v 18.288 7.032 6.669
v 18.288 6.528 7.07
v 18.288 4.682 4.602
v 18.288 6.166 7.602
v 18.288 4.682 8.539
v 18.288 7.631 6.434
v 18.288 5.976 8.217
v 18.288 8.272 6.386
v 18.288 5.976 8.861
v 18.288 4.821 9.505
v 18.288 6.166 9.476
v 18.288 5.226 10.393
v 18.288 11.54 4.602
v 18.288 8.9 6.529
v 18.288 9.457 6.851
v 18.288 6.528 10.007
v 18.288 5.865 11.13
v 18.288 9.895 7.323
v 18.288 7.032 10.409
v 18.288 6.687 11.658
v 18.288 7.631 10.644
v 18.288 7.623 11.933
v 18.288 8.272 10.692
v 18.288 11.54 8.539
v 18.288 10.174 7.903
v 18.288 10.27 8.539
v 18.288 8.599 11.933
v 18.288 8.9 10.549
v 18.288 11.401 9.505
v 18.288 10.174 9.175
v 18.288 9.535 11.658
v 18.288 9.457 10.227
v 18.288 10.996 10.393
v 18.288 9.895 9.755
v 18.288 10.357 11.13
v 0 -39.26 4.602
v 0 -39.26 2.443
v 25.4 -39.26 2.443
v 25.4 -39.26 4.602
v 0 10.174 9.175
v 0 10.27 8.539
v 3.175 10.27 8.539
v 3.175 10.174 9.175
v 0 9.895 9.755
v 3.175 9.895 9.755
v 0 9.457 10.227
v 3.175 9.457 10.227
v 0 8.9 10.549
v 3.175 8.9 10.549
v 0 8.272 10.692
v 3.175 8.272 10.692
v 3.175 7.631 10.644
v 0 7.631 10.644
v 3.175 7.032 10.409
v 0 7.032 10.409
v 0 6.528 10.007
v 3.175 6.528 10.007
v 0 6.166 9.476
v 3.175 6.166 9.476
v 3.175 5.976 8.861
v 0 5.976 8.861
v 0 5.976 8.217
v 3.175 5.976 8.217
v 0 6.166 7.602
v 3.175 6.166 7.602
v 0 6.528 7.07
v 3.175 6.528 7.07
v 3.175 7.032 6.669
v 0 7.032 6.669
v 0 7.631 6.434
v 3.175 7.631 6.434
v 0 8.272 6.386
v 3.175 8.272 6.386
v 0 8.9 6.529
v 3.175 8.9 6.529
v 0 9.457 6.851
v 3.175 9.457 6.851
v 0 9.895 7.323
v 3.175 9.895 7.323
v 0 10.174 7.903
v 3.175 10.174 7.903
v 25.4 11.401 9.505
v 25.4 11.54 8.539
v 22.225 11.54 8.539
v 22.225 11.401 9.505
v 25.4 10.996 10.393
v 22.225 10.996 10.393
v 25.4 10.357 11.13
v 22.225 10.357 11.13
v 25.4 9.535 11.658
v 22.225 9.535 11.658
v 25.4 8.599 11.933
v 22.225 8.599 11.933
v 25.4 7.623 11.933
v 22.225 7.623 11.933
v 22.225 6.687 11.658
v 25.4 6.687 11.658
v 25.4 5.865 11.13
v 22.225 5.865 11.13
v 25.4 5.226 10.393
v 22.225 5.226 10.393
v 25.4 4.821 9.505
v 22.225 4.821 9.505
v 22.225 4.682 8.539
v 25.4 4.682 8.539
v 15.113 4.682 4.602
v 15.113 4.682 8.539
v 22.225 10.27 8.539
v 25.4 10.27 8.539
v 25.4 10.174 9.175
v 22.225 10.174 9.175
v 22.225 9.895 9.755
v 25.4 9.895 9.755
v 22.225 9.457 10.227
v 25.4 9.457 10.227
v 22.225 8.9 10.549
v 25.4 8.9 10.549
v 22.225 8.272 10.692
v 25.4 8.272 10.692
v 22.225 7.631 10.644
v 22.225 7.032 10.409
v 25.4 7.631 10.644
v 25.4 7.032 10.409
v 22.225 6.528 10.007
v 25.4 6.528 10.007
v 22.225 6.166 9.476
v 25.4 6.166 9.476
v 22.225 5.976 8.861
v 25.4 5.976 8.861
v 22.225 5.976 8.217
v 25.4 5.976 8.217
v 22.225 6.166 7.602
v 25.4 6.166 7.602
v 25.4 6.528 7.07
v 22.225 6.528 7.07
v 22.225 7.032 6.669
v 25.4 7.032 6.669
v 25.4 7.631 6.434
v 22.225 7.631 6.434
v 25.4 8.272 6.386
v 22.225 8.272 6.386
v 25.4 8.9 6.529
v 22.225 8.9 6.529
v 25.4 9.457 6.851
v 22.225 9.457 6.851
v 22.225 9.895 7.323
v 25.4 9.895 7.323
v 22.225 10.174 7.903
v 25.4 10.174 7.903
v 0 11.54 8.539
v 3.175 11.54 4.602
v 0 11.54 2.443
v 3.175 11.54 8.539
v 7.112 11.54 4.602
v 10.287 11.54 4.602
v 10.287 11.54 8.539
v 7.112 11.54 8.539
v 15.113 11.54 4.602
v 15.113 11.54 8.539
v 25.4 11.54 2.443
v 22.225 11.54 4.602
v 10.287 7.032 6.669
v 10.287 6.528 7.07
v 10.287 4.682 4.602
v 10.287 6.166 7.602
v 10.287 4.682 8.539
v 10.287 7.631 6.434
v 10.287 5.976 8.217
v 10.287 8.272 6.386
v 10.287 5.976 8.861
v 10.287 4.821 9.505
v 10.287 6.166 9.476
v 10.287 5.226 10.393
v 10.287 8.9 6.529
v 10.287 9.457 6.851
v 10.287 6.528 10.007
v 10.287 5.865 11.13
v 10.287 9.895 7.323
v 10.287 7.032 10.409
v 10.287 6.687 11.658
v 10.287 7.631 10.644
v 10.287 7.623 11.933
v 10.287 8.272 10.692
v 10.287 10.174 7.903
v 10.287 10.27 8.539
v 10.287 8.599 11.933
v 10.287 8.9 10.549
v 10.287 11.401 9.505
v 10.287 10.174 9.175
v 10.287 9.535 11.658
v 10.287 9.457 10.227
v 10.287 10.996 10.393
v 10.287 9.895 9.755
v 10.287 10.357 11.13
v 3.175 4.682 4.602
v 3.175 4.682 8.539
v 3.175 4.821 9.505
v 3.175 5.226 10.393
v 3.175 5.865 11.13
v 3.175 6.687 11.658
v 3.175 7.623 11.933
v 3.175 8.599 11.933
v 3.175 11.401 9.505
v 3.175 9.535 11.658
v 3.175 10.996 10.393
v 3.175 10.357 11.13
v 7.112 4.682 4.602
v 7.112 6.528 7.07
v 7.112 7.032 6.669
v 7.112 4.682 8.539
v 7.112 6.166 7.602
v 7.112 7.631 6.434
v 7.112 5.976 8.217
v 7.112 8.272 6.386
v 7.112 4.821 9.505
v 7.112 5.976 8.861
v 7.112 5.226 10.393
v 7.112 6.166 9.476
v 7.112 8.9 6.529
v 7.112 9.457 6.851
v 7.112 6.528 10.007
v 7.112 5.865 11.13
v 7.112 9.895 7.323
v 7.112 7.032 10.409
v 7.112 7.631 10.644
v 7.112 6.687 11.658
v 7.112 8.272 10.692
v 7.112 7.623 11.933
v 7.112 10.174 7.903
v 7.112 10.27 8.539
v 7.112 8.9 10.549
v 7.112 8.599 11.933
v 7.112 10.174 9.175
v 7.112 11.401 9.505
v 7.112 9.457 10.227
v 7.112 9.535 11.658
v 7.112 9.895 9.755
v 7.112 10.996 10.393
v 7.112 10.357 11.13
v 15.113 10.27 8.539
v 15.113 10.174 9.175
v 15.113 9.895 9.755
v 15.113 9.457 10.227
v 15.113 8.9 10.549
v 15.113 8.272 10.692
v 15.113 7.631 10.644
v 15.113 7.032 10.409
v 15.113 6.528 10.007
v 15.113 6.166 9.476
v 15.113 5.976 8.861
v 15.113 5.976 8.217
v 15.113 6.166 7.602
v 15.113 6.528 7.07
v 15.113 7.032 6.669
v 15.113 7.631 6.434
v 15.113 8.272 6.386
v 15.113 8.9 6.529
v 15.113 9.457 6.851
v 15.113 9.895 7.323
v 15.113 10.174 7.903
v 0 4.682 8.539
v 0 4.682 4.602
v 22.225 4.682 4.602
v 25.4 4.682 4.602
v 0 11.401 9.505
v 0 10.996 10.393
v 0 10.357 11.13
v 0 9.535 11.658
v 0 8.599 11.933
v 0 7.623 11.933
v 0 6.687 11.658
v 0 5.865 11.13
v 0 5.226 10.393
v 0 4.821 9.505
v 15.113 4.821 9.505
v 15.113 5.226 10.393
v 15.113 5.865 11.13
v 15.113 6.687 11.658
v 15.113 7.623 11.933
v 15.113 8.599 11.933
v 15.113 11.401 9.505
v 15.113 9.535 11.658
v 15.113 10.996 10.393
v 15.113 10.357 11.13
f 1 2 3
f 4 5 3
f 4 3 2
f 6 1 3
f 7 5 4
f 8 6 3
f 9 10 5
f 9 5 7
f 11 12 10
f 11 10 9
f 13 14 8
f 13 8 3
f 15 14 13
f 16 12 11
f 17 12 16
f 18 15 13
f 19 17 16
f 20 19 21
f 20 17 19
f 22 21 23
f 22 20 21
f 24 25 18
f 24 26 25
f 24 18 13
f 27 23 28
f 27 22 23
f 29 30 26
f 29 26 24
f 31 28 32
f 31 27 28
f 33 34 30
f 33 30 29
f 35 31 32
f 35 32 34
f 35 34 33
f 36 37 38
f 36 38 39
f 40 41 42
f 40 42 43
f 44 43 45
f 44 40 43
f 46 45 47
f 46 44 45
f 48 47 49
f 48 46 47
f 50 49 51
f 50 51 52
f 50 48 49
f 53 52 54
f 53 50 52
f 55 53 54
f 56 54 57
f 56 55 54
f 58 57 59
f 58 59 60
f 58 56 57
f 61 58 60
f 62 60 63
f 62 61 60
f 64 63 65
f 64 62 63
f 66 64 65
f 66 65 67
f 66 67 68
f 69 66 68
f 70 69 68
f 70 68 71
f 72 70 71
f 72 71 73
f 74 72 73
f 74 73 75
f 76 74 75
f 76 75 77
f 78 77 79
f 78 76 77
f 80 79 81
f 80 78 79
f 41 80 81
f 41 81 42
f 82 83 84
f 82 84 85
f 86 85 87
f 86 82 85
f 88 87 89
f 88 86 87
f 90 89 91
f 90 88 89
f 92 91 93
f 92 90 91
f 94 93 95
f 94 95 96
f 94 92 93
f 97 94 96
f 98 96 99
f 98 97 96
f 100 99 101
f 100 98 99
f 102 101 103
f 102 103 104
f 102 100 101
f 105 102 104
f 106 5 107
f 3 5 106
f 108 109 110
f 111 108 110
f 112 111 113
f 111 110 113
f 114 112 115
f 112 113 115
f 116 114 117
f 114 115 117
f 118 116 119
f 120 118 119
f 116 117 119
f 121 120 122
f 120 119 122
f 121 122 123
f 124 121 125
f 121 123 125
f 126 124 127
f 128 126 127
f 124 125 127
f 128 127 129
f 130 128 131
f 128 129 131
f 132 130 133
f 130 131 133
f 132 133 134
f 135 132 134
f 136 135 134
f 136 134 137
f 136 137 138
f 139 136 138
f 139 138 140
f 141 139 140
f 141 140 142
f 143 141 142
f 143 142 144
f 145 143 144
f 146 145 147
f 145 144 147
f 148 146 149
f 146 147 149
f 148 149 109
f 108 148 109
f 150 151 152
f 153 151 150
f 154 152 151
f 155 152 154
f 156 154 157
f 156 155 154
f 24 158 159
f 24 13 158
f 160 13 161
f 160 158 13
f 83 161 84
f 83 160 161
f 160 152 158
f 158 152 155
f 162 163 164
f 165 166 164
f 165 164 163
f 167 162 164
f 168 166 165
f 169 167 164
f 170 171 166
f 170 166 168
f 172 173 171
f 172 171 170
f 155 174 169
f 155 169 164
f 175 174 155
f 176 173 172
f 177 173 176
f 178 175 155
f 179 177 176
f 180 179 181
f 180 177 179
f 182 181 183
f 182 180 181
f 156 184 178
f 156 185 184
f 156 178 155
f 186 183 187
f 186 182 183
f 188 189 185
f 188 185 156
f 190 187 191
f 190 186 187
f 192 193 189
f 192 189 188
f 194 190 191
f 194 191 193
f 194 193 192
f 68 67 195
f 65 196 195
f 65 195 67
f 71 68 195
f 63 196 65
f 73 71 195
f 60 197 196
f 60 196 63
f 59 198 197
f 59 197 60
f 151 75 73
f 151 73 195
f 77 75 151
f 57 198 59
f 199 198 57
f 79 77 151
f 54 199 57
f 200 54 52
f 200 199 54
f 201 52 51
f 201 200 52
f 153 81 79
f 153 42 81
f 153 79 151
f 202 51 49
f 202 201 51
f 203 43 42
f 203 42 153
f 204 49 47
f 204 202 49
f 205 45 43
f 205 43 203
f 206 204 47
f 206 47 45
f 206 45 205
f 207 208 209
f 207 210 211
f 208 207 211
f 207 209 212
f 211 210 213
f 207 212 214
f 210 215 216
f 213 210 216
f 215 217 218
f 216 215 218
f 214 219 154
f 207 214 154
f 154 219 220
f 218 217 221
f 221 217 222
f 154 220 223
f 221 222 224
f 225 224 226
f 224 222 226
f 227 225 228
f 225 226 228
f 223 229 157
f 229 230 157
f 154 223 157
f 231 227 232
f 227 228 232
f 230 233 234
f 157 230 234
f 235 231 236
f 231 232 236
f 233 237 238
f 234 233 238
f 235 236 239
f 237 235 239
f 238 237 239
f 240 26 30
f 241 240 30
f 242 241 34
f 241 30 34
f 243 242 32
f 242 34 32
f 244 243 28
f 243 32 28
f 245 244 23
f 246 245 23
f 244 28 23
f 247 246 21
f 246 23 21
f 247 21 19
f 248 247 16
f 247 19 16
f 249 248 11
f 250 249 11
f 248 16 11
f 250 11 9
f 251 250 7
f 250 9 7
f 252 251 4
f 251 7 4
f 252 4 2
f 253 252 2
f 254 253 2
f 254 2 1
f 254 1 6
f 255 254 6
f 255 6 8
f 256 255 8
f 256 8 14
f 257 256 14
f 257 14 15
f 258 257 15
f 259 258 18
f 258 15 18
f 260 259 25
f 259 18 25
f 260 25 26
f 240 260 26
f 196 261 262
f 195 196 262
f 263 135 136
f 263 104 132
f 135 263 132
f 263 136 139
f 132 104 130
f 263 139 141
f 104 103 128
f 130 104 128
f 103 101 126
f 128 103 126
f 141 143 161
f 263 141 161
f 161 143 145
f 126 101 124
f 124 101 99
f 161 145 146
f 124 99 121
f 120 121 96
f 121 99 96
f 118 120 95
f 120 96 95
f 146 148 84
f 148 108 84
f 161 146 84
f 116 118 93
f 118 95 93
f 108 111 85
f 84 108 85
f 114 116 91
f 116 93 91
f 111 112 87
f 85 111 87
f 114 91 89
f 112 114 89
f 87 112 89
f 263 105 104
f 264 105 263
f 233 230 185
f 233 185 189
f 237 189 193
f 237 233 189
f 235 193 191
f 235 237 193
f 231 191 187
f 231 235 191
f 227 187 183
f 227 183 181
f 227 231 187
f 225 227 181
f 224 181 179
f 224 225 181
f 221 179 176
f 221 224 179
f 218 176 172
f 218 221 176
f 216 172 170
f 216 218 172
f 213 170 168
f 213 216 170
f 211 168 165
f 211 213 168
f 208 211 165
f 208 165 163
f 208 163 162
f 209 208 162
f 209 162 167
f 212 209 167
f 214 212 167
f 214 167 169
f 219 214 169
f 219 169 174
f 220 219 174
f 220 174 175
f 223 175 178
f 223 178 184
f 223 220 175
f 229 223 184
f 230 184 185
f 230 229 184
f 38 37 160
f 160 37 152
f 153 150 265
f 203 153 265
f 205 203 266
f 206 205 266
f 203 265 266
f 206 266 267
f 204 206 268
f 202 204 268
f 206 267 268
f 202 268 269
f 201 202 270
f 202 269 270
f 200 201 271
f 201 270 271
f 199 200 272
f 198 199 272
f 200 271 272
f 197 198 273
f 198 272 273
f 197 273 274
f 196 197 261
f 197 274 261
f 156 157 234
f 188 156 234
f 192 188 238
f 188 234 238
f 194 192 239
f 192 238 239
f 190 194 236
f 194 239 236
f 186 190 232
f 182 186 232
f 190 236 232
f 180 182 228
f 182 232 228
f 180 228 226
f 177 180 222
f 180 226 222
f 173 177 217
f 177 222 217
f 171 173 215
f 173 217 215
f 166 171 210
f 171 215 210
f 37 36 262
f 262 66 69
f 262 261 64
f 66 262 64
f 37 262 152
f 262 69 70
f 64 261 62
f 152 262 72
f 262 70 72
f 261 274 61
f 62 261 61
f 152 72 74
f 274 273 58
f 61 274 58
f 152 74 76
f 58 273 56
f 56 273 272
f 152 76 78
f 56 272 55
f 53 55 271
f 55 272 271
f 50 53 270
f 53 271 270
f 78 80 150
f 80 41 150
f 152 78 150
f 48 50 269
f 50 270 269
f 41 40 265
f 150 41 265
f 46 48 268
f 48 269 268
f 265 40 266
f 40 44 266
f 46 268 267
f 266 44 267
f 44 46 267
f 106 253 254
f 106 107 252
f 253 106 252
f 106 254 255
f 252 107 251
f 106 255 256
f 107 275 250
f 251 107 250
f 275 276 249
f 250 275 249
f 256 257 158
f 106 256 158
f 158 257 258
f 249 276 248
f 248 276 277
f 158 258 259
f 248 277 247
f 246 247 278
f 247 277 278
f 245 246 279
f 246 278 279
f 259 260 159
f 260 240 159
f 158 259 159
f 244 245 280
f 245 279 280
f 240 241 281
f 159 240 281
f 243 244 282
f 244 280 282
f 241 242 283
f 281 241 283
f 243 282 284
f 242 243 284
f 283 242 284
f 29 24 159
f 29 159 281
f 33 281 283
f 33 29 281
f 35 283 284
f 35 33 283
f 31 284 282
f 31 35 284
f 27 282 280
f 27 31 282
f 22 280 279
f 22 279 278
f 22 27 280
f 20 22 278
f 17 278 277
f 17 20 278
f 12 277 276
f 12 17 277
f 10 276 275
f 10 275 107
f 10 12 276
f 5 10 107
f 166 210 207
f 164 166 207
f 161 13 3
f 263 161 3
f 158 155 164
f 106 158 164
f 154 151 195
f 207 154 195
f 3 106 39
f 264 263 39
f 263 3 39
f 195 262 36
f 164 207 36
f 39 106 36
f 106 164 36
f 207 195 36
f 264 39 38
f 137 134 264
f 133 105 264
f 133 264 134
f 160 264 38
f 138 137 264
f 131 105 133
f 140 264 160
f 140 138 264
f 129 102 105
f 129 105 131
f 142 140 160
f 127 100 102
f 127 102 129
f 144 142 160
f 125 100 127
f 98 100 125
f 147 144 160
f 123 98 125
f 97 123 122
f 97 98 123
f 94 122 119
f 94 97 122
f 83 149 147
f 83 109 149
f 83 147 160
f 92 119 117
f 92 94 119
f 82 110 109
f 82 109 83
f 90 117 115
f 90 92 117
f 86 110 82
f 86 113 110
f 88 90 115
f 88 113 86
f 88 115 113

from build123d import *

# Parameters (mm, degrees)
F0_W      = 43.942
F0_H      = 2.159
F0_W_2    = 6.858
F1_DEPTH  = 25.4
F0_R      = 2.159
F2_DEPTH  = 3.175
F3_R      = 2.159
F4_DEPTH  = 3.175
F6_R      = 2.159
F7_DEPTH  = 3.175
F9_R      = 2.159
F10_DEPTH = 3.175


with BuildPart() as f1:
    # F0 (on Right) → F1 (new body)
    with BuildSketch(Plane.YZ):
        with Locations((-17.288983049, 3.5224220661)):
            Rectangle(F0_W, F0_H)
        with Locations((8.111016951, 3.5224220661)):
            Rectangle(F0_W_2, F0_H)
    extrude(amount=F1_DEPTH)

    # F0 (on Right) → F2 (join)
    with BuildSketch(Plane.YZ):
        with BuildLine():
            Line((4.682016951, 8.5389220661), (4.682016951, 4.6019220661))
            Line((4.682016951, 4.6019220661), (11.540016951, 4.6019220661))
            Line((11.540016951, 4.6019220661), (11.540016951, 8.5389220661))
            ThreePointArc((11.540016951, 8.5389220661), (8.111016951, 5.1099220661), (4.682016951, 8.5389220661))
        make_face()
        with BuildLine():
            ThreePointArc((11.540016951, 8.5389220661), (8.111016951, 11.9679220661), (4.682016951, 8.5389220661))
            ThreePointArc((4.682016951, 8.5389220661), (8.111016951, 5.1099220661), (11.540016951, 8.5389220661))
        make_face()
        with Locations((8.111016951, 8.5389220661)):
            Circle(F0_R, mode=Mode.SUBTRACT)
    extrude(amount=F2_DEPTH)

    # F3 (on face) → F4 (join)
    with BuildSketch(Plane.YZ.offset(25.4)):
        with BuildLine():
            ThreePointArc((4.682016951, 8.5389220661), (8.111016951, 5.1099220661), (11.540016951, 8.5389220661))
            ThreePointArc((11.540016951, 8.5389220661), (8.111016951, 11.9679220661), (4.682016951, 8.5389220661))
        make_face()
        with Locations((8.111016951, 8.5389220661)):
            Circle(F3_R, mode=Mode.SUBTRACT)
        with BuildLine():
            Line((11.540016951, 4.6019220661), (11.540016951, 8.5389220661))
            ThreePointArc((11.540016951, 8.5389220661), (8.111016951, 5.1099220661), (4.682016951, 8.5389220661))
            Line((4.682016951, 8.5389220661), (4.682016951, 4.6019220661))
            Line((4.682016951, 4.6019220661), (11.540016951, 4.6019220661))
        make_face()
    extrude(amount=-F4_DEPTH)

    # F6 (on offset) → F7 (join)
    with BuildSketch(Plane.YZ.offset(7.112)):
        with BuildLine():
            Line((11.540016951, 4.6019220661), (11.540016951, 8.5389220661))
            ThreePointArc((11.540016951, 8.5389220661), (8.111016951, 11.9679220661), (4.682016951, 8.5389220661))
            Line((4.682016951, 8.5389220661), (4.682016951, 4.6019220661))
            Line((4.682016951, 4.6019220661), (11.540016951, 4.6019220661))
        make_face()
        with Locations((8.111016951, 8.5389220661)):
            Circle(F6_R, mode=Mode.SUBTRACT)
    extrude(amount=F7_DEPTH)

    # F9 (on offset) → F10 (join)
    with BuildSketch(Plane.YZ.offset(18.288)):
        with BuildLine():
            Line((4.682016951, 8.5389220661), (4.682016951, 4.6019220661))
            Line((4.682016951, 4.6019220661), (11.540016951, 4.6019220661))
            Line((11.540016951, 4.6019220661), (11.540016951, 8.5389220661))
            ThreePointArc((11.540016951, 8.5389220661), (8.111016951, 11.9679220661), (4.682016951, 8.5389220661))
        make_face()
        with Locations((8.111016951, 8.5389220661)):
            Circle(F9_R, mode=Mode.SUBTRACT)
    extrude(amount=-F10_DEPTH)


solid = f1.part
